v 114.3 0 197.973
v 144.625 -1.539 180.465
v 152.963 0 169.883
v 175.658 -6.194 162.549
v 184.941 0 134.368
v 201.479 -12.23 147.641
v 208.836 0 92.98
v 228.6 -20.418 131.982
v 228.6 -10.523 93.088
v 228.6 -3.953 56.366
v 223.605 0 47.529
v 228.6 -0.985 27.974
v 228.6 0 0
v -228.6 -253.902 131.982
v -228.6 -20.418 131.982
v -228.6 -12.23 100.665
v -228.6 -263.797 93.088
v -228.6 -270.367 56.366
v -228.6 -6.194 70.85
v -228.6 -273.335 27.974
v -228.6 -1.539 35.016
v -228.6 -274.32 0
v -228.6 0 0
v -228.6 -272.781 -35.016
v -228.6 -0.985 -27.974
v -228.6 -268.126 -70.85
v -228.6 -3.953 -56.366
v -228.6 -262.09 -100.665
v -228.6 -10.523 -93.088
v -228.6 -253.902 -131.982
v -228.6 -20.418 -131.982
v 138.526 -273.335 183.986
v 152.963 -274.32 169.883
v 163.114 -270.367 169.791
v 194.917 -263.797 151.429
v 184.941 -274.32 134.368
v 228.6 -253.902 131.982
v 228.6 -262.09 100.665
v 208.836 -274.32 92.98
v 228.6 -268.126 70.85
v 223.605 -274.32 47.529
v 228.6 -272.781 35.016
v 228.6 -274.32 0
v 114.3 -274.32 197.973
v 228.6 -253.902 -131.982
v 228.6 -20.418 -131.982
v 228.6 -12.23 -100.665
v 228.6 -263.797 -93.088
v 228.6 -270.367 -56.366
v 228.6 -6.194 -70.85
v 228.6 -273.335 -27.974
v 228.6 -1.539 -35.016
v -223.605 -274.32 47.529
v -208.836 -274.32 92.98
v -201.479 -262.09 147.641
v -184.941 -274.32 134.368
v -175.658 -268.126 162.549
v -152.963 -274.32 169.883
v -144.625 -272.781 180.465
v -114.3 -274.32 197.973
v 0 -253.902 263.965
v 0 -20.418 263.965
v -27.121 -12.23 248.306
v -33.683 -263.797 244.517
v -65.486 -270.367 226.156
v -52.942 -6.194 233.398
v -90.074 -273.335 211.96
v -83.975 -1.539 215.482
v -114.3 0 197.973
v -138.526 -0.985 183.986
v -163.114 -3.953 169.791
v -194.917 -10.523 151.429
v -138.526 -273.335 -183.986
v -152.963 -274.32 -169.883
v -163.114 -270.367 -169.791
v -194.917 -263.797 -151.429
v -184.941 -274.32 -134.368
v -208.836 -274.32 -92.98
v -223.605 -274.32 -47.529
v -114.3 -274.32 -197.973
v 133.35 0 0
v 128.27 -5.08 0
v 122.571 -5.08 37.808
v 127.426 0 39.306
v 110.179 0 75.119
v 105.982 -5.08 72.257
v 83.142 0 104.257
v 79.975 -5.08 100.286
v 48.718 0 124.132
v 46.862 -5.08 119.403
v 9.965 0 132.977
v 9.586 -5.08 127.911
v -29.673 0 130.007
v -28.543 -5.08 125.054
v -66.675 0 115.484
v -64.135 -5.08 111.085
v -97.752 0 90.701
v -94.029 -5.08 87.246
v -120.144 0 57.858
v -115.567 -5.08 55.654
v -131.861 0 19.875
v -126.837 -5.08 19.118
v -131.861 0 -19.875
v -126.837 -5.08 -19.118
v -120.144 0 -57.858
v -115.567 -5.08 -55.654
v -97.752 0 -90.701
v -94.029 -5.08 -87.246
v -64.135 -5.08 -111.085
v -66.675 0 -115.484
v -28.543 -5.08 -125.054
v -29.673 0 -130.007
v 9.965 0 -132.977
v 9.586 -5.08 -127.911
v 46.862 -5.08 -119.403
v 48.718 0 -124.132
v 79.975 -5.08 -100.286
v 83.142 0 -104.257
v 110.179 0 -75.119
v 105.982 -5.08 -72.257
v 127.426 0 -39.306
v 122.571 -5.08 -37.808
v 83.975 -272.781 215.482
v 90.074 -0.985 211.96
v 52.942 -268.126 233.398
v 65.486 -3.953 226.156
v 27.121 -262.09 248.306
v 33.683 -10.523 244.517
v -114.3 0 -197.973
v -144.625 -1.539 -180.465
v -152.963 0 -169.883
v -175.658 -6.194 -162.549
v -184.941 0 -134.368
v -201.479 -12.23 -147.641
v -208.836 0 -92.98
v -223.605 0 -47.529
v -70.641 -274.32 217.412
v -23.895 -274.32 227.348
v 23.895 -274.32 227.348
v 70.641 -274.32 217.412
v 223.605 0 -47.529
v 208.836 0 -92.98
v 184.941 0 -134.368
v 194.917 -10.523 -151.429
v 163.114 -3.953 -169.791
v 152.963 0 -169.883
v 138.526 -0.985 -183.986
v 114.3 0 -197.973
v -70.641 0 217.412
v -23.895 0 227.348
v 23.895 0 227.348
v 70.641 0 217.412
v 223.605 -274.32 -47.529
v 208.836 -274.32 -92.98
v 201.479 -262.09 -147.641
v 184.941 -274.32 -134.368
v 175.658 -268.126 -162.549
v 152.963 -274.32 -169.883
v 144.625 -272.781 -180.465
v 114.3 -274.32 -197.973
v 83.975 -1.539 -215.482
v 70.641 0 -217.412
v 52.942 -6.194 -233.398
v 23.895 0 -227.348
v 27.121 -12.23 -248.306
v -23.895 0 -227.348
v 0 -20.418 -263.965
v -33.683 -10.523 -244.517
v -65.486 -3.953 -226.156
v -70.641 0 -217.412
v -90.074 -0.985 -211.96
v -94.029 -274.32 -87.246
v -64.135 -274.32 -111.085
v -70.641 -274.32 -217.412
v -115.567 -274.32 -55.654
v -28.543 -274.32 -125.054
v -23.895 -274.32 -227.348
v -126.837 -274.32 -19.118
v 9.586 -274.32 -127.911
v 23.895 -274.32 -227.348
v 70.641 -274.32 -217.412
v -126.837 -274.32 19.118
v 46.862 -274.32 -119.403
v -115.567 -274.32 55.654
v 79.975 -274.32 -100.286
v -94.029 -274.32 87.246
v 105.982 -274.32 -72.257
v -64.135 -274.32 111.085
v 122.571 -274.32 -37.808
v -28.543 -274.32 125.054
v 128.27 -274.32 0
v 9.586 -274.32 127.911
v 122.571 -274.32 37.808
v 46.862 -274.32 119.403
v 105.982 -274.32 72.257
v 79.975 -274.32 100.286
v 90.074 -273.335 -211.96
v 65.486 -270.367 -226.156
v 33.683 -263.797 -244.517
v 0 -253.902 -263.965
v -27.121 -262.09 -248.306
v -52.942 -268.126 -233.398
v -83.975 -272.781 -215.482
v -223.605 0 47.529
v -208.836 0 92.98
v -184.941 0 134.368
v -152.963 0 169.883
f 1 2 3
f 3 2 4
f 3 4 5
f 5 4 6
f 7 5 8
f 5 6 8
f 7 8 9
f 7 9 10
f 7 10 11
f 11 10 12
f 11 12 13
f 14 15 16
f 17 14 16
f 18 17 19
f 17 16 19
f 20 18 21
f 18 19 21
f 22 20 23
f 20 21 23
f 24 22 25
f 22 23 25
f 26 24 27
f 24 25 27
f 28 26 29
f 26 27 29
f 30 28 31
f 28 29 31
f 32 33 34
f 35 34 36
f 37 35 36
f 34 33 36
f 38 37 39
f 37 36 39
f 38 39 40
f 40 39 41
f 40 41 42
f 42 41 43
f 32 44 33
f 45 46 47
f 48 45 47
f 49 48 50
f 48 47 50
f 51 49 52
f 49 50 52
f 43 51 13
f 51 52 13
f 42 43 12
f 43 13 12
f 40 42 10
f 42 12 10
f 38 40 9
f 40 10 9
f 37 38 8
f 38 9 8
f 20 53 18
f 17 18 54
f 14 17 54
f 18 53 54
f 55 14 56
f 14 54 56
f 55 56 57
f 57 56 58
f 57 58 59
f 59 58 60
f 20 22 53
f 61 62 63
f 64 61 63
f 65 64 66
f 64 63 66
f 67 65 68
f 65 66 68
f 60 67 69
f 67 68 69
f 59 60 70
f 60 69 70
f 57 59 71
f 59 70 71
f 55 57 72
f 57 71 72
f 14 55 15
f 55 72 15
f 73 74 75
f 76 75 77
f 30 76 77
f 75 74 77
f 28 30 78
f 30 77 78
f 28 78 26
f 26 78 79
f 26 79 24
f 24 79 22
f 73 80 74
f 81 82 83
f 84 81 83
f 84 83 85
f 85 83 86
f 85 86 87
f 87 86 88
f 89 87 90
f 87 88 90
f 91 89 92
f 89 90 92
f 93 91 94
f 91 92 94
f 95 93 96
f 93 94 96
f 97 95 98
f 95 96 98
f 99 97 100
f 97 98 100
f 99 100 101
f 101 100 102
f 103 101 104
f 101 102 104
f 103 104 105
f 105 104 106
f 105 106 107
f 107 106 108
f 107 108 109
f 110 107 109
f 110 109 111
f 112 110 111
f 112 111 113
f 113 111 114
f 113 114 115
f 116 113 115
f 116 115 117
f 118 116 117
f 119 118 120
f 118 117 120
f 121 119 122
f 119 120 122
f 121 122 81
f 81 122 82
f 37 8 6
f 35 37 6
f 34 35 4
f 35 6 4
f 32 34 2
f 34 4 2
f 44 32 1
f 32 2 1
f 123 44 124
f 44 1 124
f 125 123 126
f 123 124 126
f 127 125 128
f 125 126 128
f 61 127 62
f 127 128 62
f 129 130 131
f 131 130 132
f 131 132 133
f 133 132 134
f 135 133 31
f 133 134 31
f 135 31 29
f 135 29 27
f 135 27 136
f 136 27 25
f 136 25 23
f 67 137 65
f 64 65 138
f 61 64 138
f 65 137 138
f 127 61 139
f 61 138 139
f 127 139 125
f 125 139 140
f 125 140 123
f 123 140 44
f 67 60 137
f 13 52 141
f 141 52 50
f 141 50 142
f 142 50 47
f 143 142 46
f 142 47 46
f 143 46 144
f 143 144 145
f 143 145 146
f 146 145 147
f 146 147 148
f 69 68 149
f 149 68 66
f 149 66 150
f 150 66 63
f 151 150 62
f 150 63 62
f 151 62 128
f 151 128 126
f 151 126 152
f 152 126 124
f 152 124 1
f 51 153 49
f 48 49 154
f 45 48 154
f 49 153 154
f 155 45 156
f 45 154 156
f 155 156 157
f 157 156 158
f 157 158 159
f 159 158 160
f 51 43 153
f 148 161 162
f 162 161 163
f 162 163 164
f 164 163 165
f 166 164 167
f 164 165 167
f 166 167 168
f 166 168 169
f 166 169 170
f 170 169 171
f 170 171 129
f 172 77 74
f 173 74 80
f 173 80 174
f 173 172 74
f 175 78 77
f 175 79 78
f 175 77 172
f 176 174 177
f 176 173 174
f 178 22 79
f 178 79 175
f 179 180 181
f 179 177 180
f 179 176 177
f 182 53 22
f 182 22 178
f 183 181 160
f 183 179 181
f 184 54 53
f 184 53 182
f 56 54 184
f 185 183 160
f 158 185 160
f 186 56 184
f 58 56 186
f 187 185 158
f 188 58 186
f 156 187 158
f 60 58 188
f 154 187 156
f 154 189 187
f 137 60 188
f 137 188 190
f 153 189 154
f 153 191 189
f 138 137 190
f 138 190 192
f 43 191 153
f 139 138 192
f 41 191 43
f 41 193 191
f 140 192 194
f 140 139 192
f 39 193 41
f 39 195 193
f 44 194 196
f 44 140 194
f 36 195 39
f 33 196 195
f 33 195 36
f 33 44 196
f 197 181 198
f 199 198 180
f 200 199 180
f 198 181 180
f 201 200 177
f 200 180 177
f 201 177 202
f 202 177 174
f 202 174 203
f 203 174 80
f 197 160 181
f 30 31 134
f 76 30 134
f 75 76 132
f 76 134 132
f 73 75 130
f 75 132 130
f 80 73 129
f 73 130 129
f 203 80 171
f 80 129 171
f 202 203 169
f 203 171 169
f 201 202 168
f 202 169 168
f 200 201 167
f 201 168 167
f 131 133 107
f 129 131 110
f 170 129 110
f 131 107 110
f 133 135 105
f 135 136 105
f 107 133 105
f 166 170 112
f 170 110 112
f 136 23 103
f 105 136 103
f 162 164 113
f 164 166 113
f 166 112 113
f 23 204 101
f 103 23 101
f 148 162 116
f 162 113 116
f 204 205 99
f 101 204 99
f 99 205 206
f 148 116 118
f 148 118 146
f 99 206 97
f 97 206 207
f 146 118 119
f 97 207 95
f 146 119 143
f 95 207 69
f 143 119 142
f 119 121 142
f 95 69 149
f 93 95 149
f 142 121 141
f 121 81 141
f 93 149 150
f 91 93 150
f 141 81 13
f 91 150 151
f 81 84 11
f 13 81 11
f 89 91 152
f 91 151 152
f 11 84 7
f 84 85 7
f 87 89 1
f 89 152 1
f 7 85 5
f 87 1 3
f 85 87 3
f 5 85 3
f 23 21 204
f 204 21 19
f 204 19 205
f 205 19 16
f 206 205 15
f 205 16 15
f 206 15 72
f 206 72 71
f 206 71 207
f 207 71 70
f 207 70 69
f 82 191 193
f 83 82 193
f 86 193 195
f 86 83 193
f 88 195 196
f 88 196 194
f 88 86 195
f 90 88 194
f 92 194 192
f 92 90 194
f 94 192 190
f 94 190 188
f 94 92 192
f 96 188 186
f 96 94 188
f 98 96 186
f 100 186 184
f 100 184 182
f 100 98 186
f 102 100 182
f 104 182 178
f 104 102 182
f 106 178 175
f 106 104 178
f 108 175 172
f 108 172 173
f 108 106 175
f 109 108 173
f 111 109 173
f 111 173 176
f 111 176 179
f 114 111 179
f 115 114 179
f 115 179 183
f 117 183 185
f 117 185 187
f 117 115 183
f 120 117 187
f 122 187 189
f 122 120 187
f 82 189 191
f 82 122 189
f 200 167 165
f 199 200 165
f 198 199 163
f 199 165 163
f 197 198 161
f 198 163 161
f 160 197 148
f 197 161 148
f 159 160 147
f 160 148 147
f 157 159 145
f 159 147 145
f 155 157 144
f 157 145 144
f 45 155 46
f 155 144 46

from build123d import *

# Parameters (mm, degrees)
F0_R     = 128.27
F1_DEPTH = 274.32
F6_SIZE  = 5.08


with BuildPart() as f1:
    # F0 (on Front) → F1 (new body)
    with BuildSketch(Plane.XZ):
        Polygon((228.6, -131.982272), (228.6, 131.982272), (0, 263.964543), (-228.6, 131.982272), (-228.6, -131.982272), (0, -263.964543), align=None)
        Circle(F0_R, mode=Mode.SUBTRACT)
    extrude(amount=F1_DEPTH)


with BuildPart() as f2_1:
    # F2: copy of F1
    add(f1.part)

    # F4 (on Top) → F5 (revolve, cut)
    with BuildSketch(Plane.XY):
        Polygon((435.953124, -154.604618), (228.6, -274.32), (435.953124, -274.32), align=None)
        Polygon((228.6, 0), (435.953124, -119.715382), (435.953124, 0), align=None)
    revolve(axis=Axis((0, -137.16, 0), (0, 1, 0)), mode=Mode.SUBTRACT)

    # F6
    f6_edges = [f2_1.edges().sort_by_distance(p)[0] for p in [
        (-128.27, 0, 0),
    ]]
    chamfer(f6_edges, length=F6_SIZE)


solid = f2_1.part
